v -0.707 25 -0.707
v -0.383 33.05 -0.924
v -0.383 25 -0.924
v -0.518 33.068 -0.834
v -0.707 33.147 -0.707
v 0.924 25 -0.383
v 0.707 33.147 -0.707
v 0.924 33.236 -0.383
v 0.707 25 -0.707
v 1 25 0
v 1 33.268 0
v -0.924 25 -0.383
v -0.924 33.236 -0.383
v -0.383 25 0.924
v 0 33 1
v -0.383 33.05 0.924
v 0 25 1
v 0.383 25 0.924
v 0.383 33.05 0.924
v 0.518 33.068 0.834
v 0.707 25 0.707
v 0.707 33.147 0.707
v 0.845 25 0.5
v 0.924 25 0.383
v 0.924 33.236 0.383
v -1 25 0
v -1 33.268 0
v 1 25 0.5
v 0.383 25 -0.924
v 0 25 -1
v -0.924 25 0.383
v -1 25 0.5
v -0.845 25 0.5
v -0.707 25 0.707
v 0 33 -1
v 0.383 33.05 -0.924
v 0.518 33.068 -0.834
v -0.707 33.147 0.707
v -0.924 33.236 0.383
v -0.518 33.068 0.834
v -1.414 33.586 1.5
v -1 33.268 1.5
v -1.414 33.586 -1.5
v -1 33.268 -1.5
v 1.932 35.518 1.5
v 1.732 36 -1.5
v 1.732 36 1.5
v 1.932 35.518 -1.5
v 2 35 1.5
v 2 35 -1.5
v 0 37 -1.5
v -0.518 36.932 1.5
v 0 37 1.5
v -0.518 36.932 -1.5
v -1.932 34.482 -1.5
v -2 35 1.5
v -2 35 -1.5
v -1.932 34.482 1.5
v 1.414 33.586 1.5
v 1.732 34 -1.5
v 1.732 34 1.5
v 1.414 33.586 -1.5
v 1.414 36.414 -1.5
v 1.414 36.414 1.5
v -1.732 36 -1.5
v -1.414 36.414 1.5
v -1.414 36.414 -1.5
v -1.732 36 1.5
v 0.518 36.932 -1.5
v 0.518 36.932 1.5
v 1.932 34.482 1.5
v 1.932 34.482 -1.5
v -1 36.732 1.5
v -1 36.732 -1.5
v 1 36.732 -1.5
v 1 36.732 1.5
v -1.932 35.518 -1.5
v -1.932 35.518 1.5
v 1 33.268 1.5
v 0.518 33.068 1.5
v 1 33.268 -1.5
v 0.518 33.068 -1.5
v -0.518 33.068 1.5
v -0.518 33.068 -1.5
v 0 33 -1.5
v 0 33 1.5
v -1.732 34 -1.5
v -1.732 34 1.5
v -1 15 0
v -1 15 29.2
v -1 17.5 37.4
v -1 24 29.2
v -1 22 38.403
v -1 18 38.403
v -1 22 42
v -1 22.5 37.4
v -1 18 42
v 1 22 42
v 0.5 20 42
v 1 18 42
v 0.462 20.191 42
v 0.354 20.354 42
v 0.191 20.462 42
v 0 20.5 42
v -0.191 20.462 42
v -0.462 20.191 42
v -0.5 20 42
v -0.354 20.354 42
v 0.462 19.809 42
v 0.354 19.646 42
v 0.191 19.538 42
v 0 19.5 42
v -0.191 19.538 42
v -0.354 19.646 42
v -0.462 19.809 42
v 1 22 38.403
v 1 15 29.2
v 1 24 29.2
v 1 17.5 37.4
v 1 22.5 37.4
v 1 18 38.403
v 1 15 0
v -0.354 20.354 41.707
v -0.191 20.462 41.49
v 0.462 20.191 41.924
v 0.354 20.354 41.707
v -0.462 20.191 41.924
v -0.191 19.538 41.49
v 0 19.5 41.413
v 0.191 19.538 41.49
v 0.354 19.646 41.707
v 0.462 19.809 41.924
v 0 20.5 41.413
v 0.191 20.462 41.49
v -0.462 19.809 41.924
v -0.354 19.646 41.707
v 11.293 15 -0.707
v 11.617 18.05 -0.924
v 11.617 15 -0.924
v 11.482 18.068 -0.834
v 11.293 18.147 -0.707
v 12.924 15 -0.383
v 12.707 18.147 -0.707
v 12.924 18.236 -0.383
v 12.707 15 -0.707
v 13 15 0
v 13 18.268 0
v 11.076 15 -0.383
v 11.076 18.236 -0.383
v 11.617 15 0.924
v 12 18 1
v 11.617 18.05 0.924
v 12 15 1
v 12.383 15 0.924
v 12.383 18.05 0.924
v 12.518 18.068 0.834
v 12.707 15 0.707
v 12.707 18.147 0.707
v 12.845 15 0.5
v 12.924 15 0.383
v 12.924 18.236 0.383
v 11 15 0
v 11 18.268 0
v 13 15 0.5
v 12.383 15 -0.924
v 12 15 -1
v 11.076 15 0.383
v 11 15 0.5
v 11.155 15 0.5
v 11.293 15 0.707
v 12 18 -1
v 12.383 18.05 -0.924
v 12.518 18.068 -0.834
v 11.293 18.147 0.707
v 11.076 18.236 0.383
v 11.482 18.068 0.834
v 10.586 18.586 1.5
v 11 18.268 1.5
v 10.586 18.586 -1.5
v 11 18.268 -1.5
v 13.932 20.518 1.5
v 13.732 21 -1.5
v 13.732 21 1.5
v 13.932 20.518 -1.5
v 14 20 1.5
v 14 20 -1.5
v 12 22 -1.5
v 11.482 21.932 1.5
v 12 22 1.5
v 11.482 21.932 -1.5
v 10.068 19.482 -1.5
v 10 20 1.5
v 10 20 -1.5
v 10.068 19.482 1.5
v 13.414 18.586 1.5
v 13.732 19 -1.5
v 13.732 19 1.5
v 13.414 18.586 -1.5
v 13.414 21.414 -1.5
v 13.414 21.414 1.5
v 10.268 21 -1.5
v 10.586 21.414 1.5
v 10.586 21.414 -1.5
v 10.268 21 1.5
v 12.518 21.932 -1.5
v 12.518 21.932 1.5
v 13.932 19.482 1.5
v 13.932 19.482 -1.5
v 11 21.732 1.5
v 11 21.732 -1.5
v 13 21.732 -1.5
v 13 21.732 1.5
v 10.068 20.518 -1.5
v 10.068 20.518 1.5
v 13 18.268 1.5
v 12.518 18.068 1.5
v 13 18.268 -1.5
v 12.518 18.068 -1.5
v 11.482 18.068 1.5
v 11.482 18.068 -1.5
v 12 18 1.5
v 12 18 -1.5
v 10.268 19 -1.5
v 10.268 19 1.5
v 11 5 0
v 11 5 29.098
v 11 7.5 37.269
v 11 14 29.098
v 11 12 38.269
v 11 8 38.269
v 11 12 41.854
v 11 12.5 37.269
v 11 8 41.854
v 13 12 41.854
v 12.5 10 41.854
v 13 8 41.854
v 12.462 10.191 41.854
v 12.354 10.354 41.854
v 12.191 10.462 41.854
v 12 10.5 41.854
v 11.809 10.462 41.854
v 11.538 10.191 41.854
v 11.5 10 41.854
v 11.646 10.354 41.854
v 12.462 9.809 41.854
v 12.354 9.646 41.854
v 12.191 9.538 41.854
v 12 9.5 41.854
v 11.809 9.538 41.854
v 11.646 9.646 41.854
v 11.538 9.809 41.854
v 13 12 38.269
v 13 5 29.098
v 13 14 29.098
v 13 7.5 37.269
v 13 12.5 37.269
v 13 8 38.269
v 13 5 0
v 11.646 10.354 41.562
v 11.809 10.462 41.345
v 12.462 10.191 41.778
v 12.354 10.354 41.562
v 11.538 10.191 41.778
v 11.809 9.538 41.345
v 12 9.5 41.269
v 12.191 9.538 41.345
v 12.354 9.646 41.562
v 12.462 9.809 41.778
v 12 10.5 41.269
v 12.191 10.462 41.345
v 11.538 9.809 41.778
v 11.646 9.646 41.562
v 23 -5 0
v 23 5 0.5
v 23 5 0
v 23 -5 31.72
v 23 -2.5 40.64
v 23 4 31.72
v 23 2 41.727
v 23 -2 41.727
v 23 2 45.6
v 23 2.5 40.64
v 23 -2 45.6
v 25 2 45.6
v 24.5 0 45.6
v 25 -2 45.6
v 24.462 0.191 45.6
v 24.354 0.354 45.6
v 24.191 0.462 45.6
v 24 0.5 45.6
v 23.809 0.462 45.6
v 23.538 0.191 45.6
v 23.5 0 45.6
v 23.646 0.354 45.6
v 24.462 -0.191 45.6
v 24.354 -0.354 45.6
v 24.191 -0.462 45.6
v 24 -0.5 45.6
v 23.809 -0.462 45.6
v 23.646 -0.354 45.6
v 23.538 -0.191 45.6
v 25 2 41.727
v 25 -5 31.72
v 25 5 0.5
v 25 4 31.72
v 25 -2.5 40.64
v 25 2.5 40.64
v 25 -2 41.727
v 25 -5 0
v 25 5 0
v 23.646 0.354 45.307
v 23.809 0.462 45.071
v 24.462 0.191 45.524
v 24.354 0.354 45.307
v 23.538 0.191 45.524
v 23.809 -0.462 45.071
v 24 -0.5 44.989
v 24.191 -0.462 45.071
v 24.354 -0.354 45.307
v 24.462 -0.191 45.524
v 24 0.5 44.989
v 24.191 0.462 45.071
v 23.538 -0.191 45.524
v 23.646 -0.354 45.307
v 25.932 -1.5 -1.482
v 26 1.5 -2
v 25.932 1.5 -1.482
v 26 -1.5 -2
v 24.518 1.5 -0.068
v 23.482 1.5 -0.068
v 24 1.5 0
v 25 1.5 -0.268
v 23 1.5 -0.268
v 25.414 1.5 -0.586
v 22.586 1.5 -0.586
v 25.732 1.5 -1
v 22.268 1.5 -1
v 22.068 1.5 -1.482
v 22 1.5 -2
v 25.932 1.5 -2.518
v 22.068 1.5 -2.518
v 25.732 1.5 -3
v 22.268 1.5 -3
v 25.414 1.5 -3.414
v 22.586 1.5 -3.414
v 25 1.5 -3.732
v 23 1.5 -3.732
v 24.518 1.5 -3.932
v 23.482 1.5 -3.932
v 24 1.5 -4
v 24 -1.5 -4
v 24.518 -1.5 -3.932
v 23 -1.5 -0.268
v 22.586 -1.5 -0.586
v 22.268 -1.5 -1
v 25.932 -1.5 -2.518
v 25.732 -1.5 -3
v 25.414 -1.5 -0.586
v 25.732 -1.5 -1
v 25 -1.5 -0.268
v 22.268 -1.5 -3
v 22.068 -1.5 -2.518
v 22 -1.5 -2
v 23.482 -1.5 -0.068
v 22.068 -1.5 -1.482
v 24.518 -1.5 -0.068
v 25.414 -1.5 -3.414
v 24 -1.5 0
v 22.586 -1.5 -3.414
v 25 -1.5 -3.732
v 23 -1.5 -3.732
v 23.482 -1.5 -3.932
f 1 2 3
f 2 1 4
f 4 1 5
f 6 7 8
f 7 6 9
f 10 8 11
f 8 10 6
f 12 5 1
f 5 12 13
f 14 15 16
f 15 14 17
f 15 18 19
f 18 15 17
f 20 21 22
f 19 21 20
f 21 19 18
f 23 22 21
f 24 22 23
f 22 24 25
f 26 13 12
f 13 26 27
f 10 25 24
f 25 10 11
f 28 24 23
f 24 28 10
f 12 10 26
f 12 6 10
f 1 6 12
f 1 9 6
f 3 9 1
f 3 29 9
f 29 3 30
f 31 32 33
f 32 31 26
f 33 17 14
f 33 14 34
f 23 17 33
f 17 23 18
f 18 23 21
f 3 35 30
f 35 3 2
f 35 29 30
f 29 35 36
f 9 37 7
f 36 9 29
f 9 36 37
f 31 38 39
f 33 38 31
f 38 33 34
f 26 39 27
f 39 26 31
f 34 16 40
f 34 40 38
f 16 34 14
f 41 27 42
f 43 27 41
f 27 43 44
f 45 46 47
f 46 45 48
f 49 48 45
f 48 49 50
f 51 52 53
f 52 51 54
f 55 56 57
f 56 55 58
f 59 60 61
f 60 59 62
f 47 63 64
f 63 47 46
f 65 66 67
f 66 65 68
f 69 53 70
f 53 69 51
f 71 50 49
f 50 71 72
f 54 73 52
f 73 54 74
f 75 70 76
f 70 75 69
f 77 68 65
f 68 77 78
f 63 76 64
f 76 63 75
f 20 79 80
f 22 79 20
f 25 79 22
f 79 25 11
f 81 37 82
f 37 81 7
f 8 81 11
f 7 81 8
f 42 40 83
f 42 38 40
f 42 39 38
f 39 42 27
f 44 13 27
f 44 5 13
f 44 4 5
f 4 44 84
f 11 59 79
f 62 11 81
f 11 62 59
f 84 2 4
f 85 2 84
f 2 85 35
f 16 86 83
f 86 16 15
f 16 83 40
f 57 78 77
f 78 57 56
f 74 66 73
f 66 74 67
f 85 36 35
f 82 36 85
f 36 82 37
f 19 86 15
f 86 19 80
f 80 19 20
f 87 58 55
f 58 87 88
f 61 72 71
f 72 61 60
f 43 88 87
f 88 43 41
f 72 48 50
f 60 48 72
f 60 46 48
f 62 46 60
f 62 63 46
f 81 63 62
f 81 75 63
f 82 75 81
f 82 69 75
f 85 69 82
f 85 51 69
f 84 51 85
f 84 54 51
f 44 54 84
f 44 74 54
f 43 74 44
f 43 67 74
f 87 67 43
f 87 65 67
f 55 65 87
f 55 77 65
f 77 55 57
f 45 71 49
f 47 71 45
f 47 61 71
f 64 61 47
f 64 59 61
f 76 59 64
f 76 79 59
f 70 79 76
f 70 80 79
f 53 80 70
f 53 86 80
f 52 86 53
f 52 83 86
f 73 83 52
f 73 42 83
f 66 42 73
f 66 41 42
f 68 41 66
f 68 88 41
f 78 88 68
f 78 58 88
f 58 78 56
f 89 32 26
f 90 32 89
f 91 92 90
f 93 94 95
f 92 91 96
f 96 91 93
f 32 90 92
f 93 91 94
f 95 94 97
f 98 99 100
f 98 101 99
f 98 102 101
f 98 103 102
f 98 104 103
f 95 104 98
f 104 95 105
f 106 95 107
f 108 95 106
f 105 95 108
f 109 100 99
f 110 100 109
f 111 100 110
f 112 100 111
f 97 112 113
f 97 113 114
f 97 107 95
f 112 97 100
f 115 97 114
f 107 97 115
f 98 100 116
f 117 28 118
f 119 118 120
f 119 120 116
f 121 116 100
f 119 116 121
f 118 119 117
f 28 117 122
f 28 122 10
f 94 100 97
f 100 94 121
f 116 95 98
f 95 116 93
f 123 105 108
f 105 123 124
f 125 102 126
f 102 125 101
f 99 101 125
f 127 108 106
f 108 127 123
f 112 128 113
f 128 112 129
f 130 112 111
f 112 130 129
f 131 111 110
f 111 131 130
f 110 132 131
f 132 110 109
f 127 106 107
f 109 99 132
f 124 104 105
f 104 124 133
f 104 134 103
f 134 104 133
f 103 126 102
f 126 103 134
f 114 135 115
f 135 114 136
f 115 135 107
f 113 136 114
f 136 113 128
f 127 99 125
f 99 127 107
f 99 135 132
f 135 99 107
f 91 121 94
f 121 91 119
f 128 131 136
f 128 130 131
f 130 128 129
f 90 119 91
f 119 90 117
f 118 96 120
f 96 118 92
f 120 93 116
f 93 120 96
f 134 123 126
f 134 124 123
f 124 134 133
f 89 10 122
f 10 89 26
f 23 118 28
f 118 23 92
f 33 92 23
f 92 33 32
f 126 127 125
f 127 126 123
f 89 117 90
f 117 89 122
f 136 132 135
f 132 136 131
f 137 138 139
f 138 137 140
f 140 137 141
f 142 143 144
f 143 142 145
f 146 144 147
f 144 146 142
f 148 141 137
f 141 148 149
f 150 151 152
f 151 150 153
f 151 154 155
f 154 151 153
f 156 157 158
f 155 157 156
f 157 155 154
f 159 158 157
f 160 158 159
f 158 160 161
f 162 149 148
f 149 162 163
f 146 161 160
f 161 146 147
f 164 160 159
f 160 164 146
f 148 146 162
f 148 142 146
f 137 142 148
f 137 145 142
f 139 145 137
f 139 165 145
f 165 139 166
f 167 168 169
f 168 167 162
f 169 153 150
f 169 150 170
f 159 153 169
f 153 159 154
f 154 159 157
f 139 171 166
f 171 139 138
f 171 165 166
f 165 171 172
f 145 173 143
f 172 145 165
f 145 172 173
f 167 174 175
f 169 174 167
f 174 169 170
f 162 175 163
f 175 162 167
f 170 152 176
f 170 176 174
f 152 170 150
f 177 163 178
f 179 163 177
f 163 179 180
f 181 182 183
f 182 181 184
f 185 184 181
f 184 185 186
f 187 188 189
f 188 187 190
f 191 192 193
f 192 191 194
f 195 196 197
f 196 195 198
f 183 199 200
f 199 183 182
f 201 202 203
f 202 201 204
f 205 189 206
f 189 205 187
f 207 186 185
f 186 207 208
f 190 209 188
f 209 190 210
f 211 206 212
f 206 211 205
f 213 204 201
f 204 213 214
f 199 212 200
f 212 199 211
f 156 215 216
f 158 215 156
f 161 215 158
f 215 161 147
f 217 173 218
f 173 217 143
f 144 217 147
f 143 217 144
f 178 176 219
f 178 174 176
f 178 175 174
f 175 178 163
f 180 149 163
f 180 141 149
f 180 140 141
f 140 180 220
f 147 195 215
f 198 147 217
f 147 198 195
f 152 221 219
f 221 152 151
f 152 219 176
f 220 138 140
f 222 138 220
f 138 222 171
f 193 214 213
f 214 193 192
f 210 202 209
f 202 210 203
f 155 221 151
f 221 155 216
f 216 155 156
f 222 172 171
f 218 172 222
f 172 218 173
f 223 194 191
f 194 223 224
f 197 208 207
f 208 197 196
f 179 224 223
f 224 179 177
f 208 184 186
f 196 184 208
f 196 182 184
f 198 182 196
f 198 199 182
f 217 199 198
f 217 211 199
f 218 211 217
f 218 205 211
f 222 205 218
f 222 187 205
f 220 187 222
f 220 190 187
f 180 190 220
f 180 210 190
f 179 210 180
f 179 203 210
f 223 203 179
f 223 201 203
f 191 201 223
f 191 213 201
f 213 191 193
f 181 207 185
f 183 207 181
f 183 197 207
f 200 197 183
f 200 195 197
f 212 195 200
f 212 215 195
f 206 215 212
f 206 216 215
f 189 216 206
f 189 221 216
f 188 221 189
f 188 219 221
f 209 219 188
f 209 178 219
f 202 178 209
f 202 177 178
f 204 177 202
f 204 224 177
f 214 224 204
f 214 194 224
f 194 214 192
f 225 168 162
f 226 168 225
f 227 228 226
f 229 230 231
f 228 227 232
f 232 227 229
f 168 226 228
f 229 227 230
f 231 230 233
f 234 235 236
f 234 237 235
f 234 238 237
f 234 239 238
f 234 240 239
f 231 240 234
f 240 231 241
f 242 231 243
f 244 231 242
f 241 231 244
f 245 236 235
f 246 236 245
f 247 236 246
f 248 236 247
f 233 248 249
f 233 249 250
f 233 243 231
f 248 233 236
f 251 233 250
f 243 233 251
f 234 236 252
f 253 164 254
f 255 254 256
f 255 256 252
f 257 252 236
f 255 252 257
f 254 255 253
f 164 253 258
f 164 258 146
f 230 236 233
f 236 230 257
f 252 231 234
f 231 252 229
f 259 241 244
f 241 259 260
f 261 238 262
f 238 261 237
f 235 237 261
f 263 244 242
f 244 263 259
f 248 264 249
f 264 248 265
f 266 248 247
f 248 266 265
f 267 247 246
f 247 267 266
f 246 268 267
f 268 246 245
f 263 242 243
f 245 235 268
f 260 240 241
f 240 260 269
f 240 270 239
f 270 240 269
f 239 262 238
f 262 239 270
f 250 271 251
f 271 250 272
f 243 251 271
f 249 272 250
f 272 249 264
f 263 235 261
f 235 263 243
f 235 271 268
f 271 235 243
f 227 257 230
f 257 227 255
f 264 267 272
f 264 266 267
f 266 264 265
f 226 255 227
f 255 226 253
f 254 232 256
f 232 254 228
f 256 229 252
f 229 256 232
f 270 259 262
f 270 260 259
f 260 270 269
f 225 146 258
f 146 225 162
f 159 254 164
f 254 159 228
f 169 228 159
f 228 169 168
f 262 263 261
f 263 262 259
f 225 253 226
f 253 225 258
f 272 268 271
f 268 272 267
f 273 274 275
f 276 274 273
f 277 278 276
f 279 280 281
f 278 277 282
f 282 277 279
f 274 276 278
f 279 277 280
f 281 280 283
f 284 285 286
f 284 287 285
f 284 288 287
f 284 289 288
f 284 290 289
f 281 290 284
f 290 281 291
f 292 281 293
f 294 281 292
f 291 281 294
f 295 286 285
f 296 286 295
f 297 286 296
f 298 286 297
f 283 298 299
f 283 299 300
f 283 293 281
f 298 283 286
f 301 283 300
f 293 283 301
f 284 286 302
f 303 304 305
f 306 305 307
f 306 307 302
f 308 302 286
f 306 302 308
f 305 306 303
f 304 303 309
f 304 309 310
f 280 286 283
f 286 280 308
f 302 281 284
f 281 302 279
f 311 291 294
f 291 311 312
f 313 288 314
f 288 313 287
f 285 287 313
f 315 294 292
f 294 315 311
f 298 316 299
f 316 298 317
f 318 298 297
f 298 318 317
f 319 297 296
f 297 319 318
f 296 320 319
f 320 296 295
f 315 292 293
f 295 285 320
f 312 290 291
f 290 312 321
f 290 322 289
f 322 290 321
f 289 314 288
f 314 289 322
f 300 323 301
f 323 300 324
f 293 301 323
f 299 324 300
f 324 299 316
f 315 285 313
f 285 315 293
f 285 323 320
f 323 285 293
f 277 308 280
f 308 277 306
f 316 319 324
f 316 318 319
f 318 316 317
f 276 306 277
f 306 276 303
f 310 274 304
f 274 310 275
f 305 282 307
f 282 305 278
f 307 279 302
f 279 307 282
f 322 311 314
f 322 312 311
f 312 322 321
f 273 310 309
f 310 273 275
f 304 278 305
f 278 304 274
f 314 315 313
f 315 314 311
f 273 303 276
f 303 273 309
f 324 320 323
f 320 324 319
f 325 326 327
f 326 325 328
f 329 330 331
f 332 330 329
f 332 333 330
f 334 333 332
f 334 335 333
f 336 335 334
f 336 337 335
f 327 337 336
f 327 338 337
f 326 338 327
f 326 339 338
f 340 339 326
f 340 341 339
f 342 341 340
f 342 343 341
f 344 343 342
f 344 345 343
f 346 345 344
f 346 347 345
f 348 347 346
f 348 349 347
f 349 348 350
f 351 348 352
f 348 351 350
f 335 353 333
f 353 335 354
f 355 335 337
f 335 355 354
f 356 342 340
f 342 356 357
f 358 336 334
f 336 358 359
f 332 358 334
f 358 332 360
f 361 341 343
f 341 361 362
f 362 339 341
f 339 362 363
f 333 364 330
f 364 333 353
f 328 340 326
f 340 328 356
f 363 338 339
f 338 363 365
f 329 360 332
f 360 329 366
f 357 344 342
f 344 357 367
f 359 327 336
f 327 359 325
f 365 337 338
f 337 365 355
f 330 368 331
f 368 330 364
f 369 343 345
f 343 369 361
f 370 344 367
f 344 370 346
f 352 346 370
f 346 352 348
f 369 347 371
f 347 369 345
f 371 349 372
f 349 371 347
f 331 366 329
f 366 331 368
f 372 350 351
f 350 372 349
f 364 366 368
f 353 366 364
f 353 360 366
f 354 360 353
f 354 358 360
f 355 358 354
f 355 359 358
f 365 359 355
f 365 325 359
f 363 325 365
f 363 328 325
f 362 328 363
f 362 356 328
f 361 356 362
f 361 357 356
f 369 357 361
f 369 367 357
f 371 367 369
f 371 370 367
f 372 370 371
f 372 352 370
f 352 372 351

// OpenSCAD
/*
 * SLAT WITH FOLLOWER ARM
 *
 * DESIGN:
 * - Wave-shaped slat body
 * - Wire attachment hole at top (for fish wire suspension)
 * - Follower arm at bottom (extends toward cam)
 * - Roller at end of arm (contacts cam surface)
 *
 * Each layer's slats have different follower arm lengths
 * to reach their respective cams at different Y positions.
 *
 * Print: 60x total (20 per layer)
 */

include <../common.scad>

$fn = 32;

// ============================================
// MAIN SLAT MODULE
// ============================================

module slat_follower(height = SLAT_BASE_HEIGHT, layer = 0) {
    union() {
        // Main wave body
        wave_body(height);

        // Follower arm at bottom (extends in +Y toward cam)
        follower_arm(layer);

        // Wire attachment point at top
        wire_attachment(height);
    }
}

// ============================================
// WAVE BODY
// ============================================

module wave_body(height) {
    hull() {
        // Base
        translate([-SLAT_THICKNESS/2, -SLAT_DEPTH/2, 0])
            cube([SLAT_THICKNESS, SLAT_DEPTH, 0.5]);

        // Mid section
        translate([-SLAT_THICKNESS/2, -SLAT_DEPTH/2, height * 0.7])
            cube([SLAT_THICKNESS, SLAT_DEPTH * 0.9, 0.5]);

        // Upper taper
        translate([-SLAT_THICKNESS/2, -SLAT_DEPTH * 0.25, height * 0.9])
            cube([SLAT_THICKNESS, SLAT_DEPTH * 0.5, 0.5]);

        // Rounded crest
        translate([0, 0, height])
        scale([1, 0.25, 0.5])
        rotate([0, 90, 0])
            cylinder(d = 4, h = SLAT_THICKNESS, center = true, $fn = 16);
    }
}

// ============================================
// FOLLOWER ARM (extends toward cam)
// ============================================

module follower_arm(layer) {
    arm_length = FOLLOWER_ARM_Y[layer];

    if (arm_length > 0) {
        // Arm extends in +Y direction toward cam
        translate([0, SLAT_DEPTH/2, 0])
        rotate([-90, 0, 0]) {
            // Arm body
            cylinder(d = FOLLOWER_ARM_DIA, h = arm_length, $fn = 16);

            // Roller at end
            translate([0, 0, arm_length])
                follower_roller();
        }
    } else {
        // Layer 2: cam is directly below, just add roller pad
        translate([0, 0, -FOLLOWER_ROLLER_DIA/2])
            follower_roller();
    }
}

// ============================================
// FOLLOWER ROLLER
// ============================================

module follower_roller() {
    // Roller that contacts cam surface
    rotate([90, 0, 0])
        cylinder(d = FOLLOWER_ROLLER_DIA, h = FOLLOWER_ROLLER_WIDTH, center = true, $fn = 24);
}

// ============================================
// WIRE ATTACHMENT
// ============================================

module wire_attachment(height) {
    // Reinforced area at top for wire hole
    translate([0, 0, height - 3])
    difference() {
        // Thickened top
        hull() {
            translate([-SLAT_THICKNESS/2, -2, 0])
                cube([SLAT_THICKNESS, 4, 4]);
        }

        // Wire hole
        translate([0, 0, 2])
            cylinder(d = WIRE_HOLE_DIA, h = 6, center = true, $fn = 16);
    }
}

// ============================================
// SLAT WITH GUIDE TAB (for channel guides)
// ============================================

module slat_with_guide_tab(height = SLAT_BASE_HEIGHT, layer = 0) {
    union() {
        slat_follower(height, layer);

        // Guide tabs on sides (fit into channel guides)
        for (side = [-1, 1]) {
            translate([side * (SLAT_THICKNESS/2 + 0.5), 0, height/2])
                cube([1, 3, height * 0.8], center = true);
        }
    }
}

// ============================================
// RENDER - Show sample slats from each layer
// ============================================

// Layer 0 (back) - longest follower arm
translate([0, LAYER_Y_CENTER[0], 0])
color(LAYER_COLORS[0])
    slat_follower(slat_height(0), 0);

// Layer 1 (mid) - medium follower arm
translate([12, LAYER_Y_CENTER[1], 0])
color(LAYER_COLORS[1])
    slat_follower(slat_height(5), 1);

// Layer 2 (front) - no follower arm (cam directly below)
translate([24, LAYER_Y_CENTER[2], 0])
color(LAYER_COLORS[2])
    slat_follower(slat_height(10), 2);

// Show where cams would be (transparent)
for (L = [0 : NUM_LAYERS - 1]) {
    x_pos = L * 12;
    %translate([x_pos, CAM_Y[L], CAM_Z[L]])
    rotate([0, 90, 0])
        cylinder(d = CAM_MAX_RADIUS * 2, h = 5, center = true);
}

// ============================================
// INFO
// ============================================

echo("=== SLAT WITH FOLLOWER ===");
echo(str("Slat thickness: ", SLAT_THICKNESS, "mm"));
echo(str("Slat depth: ", SLAT_DEPTH, "mm"));
echo(str("Wire hole: ", WIRE_HOLE_DIA, "mm"));
echo("");
echo("FOLLOWER ARM LENGTHS:");
echo(str("  Layer 0: ", FOLLOWER_ARM_Y[0], "mm"));
echo(str("  Layer 1: ", FOLLOWER_ARM_Y[1], "mm"));
echo(str("  Layer 2: ", FOLLOWER_ARM_Y[2], "mm (direct contact)"));
echo("");
echo("Print: 60x total (20 per layer)");
